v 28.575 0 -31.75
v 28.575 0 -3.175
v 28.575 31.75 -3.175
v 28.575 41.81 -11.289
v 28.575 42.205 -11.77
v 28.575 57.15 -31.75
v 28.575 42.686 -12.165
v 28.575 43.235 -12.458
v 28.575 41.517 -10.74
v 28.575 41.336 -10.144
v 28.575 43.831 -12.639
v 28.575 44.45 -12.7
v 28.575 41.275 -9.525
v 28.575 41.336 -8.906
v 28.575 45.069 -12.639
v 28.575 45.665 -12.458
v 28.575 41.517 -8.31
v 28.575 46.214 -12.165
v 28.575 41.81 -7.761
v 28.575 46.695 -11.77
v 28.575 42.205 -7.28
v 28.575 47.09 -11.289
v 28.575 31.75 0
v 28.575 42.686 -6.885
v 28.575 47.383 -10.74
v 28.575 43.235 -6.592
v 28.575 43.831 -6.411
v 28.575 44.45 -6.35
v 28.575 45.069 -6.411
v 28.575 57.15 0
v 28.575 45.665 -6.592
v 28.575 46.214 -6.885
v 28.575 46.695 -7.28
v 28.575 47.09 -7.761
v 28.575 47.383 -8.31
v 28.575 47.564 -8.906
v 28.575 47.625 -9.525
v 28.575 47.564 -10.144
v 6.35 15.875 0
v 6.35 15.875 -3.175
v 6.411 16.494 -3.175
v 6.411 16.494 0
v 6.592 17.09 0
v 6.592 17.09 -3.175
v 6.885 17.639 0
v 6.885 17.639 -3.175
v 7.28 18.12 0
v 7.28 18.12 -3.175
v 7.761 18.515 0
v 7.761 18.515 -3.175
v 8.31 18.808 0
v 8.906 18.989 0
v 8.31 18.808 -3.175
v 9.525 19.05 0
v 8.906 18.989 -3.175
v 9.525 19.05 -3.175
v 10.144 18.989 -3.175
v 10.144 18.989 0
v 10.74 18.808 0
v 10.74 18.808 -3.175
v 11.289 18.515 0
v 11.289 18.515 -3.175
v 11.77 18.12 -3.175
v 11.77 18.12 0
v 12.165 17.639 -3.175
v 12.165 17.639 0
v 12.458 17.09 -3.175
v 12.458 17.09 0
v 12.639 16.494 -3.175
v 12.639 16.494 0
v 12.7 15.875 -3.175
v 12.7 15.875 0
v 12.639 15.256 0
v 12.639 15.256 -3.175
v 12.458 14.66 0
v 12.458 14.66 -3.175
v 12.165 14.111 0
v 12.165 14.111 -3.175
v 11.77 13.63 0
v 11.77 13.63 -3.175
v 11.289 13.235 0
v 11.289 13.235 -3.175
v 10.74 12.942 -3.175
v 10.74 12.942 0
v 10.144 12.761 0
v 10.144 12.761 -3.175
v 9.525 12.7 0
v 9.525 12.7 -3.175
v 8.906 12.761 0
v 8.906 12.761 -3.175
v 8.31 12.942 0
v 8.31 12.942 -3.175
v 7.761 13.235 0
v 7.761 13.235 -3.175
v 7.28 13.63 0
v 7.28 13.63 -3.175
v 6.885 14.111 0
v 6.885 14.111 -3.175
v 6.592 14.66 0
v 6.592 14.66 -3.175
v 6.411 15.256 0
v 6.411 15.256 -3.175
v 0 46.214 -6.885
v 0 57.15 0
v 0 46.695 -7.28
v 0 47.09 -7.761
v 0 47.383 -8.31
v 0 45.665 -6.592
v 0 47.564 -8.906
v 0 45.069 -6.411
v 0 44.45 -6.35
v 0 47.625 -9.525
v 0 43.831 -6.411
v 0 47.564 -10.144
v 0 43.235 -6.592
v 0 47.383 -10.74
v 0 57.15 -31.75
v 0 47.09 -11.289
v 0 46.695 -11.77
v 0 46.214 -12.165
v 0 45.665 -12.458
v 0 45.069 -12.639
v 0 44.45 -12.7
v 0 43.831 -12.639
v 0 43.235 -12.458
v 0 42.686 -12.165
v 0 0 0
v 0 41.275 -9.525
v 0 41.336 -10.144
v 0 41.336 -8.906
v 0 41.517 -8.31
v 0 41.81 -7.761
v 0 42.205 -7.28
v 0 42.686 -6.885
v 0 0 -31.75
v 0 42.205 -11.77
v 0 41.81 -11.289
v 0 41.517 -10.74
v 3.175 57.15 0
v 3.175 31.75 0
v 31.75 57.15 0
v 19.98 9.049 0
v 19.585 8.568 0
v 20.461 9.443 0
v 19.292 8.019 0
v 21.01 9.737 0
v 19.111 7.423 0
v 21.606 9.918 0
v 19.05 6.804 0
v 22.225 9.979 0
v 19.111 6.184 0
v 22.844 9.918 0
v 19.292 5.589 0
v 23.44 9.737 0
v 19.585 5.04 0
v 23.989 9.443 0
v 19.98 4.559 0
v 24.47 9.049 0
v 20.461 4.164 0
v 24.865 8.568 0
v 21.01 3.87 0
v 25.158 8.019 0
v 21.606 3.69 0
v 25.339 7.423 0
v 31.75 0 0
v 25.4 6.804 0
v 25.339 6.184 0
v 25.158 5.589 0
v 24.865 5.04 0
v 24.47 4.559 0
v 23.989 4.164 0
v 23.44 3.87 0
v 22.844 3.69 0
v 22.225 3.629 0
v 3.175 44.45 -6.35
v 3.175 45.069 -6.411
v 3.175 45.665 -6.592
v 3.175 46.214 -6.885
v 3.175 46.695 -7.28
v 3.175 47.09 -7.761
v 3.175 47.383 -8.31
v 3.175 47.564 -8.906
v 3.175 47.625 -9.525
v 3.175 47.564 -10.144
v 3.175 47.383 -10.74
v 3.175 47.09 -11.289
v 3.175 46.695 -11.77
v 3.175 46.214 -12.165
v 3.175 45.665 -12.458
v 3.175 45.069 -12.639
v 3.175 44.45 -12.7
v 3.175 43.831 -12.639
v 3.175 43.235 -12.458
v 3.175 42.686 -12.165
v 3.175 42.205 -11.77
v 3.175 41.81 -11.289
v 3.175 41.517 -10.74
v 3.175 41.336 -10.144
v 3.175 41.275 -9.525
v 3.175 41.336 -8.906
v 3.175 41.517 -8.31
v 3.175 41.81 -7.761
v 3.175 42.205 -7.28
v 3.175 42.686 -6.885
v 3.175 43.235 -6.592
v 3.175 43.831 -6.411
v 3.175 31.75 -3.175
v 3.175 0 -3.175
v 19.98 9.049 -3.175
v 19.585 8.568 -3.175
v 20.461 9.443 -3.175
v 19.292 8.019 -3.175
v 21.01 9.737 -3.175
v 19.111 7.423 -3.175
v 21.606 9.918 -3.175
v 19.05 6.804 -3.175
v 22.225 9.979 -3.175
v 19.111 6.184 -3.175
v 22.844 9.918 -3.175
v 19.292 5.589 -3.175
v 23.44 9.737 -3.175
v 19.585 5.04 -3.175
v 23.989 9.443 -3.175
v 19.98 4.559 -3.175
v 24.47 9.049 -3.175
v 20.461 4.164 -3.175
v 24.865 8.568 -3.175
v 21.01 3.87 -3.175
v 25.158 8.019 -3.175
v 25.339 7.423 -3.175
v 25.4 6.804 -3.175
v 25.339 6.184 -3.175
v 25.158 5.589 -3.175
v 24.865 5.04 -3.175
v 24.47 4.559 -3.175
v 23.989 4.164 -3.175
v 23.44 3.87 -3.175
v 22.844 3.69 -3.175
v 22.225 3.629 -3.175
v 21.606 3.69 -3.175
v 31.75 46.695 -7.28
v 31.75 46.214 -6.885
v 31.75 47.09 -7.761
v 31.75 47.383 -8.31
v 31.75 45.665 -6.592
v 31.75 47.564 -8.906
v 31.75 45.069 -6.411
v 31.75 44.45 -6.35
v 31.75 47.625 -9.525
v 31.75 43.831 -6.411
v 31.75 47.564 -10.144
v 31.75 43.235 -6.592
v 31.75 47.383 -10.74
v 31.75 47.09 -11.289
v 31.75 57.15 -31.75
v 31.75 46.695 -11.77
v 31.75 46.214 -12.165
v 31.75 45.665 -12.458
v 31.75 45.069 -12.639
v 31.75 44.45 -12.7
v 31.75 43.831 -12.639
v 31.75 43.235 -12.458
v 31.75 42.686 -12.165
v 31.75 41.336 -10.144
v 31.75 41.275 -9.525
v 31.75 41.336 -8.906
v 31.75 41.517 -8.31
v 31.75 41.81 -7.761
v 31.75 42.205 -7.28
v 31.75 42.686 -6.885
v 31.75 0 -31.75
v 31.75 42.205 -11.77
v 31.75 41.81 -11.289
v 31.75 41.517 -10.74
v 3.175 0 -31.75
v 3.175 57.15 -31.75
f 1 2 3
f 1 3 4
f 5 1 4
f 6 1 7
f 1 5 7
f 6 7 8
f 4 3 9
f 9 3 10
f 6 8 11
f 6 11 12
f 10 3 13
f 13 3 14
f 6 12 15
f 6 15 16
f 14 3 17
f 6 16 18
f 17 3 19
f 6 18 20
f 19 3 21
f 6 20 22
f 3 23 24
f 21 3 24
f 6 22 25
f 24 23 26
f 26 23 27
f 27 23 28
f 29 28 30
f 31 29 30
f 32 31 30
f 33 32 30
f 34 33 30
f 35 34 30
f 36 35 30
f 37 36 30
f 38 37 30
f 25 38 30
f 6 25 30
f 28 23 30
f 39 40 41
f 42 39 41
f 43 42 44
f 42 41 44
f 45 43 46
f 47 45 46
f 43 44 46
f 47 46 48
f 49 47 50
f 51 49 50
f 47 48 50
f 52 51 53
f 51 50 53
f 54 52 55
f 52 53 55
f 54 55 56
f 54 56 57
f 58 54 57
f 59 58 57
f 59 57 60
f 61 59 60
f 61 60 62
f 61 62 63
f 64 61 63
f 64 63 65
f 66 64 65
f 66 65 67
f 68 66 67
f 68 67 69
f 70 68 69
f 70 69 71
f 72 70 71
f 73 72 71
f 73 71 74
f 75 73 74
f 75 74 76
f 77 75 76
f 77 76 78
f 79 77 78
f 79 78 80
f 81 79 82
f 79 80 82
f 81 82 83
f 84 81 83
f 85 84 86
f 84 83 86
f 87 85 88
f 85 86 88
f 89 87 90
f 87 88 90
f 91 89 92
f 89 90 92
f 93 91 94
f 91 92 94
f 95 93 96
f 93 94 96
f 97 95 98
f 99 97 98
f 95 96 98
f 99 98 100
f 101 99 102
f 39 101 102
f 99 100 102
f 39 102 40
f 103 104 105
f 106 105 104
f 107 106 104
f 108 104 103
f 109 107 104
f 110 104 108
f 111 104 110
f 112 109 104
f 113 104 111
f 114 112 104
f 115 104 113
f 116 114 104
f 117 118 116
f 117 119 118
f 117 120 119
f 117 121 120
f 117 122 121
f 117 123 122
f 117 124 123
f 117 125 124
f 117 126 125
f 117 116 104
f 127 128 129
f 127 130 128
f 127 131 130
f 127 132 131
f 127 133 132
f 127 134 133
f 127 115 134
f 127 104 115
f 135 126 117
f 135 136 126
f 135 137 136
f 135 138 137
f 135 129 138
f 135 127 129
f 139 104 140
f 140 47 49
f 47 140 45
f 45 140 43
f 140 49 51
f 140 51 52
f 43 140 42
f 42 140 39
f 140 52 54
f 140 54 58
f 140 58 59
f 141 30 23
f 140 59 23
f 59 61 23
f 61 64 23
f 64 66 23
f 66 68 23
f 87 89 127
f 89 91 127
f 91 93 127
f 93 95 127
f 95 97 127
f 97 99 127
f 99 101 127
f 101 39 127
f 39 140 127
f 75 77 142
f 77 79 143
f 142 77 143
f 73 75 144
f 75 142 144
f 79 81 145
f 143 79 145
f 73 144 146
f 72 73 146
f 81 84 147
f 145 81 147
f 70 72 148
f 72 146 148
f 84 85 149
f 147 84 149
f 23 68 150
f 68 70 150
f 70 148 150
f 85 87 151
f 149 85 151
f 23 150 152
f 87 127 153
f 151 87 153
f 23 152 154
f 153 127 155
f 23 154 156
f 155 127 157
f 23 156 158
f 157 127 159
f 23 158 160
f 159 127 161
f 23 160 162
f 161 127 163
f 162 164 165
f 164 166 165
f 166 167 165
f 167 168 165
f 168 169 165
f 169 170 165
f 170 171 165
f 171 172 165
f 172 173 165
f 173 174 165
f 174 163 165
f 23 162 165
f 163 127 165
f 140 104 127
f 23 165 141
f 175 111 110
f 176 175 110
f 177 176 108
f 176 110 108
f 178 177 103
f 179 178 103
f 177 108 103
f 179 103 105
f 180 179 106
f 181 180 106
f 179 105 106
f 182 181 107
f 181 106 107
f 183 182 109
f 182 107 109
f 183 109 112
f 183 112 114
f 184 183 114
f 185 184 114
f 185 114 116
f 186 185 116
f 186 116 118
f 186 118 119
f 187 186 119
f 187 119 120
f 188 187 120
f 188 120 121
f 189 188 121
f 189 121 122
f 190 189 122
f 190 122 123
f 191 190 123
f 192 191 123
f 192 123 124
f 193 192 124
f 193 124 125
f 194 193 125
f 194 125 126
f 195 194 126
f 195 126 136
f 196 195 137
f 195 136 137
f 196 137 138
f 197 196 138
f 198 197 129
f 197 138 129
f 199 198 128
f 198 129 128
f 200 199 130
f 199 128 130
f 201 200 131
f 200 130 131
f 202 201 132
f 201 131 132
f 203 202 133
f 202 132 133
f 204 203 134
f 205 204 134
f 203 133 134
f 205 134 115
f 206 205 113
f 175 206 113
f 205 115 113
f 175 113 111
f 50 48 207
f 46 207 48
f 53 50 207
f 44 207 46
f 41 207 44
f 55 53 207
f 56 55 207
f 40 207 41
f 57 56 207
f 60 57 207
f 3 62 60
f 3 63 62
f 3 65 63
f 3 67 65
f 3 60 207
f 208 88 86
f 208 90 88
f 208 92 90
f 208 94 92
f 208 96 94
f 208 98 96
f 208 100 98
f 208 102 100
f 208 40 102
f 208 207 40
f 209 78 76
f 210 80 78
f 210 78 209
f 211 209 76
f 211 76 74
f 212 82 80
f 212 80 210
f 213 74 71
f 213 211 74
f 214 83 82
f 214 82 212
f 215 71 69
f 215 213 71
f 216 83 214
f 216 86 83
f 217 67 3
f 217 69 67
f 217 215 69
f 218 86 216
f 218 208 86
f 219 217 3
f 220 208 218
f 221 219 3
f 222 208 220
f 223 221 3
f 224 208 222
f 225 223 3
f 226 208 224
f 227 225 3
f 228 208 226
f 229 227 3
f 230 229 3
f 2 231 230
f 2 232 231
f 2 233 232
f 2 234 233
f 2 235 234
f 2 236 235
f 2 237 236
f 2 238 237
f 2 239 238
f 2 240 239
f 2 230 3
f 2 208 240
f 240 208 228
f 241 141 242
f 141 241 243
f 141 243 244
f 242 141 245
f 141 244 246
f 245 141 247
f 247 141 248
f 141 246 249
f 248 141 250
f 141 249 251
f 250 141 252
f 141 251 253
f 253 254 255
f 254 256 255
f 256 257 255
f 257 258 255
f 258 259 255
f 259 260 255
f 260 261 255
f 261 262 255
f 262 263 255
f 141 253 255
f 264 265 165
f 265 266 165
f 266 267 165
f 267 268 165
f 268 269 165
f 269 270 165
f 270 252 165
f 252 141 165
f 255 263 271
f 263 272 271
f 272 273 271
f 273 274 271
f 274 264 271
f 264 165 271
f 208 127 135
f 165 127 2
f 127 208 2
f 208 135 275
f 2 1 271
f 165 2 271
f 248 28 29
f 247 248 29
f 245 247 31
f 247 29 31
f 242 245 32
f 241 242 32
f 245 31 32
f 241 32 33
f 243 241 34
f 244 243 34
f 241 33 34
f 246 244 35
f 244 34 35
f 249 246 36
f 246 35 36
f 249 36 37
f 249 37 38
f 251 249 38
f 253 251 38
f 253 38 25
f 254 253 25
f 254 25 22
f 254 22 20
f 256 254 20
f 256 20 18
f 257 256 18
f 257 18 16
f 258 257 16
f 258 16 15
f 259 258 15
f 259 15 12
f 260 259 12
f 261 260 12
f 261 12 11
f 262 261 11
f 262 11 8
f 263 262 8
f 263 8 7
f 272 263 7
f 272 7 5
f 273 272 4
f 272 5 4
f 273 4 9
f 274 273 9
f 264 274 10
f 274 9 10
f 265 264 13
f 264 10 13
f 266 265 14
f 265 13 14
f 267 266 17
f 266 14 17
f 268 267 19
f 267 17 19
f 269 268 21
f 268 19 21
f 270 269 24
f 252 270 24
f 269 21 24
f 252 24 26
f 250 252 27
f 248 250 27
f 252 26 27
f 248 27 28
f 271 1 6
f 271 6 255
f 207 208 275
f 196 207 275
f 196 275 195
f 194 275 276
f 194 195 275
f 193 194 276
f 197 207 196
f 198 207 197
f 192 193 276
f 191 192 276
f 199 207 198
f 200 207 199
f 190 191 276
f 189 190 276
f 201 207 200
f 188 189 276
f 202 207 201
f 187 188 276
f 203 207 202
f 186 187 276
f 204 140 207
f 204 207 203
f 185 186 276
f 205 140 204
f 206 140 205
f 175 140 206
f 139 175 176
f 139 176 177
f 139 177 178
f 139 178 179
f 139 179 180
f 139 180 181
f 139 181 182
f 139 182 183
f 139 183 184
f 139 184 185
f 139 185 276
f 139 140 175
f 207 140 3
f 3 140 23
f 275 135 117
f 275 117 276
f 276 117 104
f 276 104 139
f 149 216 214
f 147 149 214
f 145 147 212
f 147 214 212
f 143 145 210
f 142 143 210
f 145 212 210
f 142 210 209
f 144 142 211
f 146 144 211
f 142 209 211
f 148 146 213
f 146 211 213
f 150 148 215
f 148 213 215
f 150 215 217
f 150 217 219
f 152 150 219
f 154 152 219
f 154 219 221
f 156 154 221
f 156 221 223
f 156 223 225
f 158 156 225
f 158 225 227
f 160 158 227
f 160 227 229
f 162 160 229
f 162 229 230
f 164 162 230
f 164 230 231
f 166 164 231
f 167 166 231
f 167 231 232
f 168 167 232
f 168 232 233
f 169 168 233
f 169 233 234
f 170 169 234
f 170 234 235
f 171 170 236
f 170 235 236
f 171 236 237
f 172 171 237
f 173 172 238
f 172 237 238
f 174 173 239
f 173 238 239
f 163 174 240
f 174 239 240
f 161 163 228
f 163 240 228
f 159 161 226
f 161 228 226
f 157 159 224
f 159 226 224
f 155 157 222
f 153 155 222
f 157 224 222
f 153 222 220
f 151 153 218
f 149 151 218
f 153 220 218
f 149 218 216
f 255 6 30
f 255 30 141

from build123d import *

# Parameters (mm, degrees)
SKETCH1_W                   = 31.75
SKETCH1_H                   = 31.75
SKETCH1_W_2                 = 25.4
SKETCH1_H_2                 = 25.4
BOSS_EXTRUDE1_DEPTH         = 57.15
F_1_4_0_25_DIAMETER_HOLE5_D = 6.35
SKETCH16_W                  = 25.4
SKETCH16_H                  = 57.15
CUT_EXTRUDE1_DEPTH          = 5.08
F_1_4_0_25_DIAMETER_HOLE7_D = 6.35
SKETCH20_W                  = 25.4
SKETCH20_H                  = 25.4
CUT_EXTRUDE2_DEPTH          = 5.08


with BuildPart() as part:
    # Sketch1 → Boss-Extrude1 (new body)
    with BuildSketch(Plane(origin=(0, 0, 0), x_dir=(1, 0, 0), z_dir=(0, 1, 0))):
        with Locations((15.875, 15.875)):
            Rectangle(SKETCH1_W, SKETCH1_H)
        with Locations((15.875, 15.875)):
            Rectangle(SKETCH1_W_2, SKETCH1_H_2, mode=Mode.SUBTRACT)
    extrude(amount=BOSS_EXTRUDE1_DEPTH)

    # 1/4 (0.25) Diameter Hole5 (through all)
    with Locations(Plane(origin=(31.75, 0, 0), x_dir=(0, 0, -1), z_dir=(1, 0, 0))):
        with Locations((9.525, 44.45)):
            Hole(F_1_4_0_25_DIAMETER_HOLE5_D / 2)

    # Sketch16 → Cut-Extrude1 (cut)
    with BuildSketch(Plane(origin=(0, 0, -31.75), x_dir=(-1, 0, 0), z_dir=(0, 0, -1))):
        with Locations((-15.875, 28.575)):
            Rectangle(SKETCH16_W, SKETCH16_H)
    extrude(amount=-CUT_EXTRUDE1_DEPTH, mode=Mode.SUBTRACT)

    # 1/4 (0.25) Diameter Hole7 (through all)
    with Locations(Plane.XY):
        with Locations((22.225, 6.803571429), (9.525, 15.875)):
            Hole(F_1_4_0_25_DIAMETER_HOLE7_D / 2)

    # Sketch20 → Cut-Extrude2 (cut)
    with BuildSketch(Plane.XY):
        with Locations((15.875, 44.45)):
            Rectangle(SKETCH20_W, SKETCH20_H)
    extrude(amount=-CUT_EXTRUDE2_DEPTH, mode=Mode.SUBTRACT)


solid = part.part
